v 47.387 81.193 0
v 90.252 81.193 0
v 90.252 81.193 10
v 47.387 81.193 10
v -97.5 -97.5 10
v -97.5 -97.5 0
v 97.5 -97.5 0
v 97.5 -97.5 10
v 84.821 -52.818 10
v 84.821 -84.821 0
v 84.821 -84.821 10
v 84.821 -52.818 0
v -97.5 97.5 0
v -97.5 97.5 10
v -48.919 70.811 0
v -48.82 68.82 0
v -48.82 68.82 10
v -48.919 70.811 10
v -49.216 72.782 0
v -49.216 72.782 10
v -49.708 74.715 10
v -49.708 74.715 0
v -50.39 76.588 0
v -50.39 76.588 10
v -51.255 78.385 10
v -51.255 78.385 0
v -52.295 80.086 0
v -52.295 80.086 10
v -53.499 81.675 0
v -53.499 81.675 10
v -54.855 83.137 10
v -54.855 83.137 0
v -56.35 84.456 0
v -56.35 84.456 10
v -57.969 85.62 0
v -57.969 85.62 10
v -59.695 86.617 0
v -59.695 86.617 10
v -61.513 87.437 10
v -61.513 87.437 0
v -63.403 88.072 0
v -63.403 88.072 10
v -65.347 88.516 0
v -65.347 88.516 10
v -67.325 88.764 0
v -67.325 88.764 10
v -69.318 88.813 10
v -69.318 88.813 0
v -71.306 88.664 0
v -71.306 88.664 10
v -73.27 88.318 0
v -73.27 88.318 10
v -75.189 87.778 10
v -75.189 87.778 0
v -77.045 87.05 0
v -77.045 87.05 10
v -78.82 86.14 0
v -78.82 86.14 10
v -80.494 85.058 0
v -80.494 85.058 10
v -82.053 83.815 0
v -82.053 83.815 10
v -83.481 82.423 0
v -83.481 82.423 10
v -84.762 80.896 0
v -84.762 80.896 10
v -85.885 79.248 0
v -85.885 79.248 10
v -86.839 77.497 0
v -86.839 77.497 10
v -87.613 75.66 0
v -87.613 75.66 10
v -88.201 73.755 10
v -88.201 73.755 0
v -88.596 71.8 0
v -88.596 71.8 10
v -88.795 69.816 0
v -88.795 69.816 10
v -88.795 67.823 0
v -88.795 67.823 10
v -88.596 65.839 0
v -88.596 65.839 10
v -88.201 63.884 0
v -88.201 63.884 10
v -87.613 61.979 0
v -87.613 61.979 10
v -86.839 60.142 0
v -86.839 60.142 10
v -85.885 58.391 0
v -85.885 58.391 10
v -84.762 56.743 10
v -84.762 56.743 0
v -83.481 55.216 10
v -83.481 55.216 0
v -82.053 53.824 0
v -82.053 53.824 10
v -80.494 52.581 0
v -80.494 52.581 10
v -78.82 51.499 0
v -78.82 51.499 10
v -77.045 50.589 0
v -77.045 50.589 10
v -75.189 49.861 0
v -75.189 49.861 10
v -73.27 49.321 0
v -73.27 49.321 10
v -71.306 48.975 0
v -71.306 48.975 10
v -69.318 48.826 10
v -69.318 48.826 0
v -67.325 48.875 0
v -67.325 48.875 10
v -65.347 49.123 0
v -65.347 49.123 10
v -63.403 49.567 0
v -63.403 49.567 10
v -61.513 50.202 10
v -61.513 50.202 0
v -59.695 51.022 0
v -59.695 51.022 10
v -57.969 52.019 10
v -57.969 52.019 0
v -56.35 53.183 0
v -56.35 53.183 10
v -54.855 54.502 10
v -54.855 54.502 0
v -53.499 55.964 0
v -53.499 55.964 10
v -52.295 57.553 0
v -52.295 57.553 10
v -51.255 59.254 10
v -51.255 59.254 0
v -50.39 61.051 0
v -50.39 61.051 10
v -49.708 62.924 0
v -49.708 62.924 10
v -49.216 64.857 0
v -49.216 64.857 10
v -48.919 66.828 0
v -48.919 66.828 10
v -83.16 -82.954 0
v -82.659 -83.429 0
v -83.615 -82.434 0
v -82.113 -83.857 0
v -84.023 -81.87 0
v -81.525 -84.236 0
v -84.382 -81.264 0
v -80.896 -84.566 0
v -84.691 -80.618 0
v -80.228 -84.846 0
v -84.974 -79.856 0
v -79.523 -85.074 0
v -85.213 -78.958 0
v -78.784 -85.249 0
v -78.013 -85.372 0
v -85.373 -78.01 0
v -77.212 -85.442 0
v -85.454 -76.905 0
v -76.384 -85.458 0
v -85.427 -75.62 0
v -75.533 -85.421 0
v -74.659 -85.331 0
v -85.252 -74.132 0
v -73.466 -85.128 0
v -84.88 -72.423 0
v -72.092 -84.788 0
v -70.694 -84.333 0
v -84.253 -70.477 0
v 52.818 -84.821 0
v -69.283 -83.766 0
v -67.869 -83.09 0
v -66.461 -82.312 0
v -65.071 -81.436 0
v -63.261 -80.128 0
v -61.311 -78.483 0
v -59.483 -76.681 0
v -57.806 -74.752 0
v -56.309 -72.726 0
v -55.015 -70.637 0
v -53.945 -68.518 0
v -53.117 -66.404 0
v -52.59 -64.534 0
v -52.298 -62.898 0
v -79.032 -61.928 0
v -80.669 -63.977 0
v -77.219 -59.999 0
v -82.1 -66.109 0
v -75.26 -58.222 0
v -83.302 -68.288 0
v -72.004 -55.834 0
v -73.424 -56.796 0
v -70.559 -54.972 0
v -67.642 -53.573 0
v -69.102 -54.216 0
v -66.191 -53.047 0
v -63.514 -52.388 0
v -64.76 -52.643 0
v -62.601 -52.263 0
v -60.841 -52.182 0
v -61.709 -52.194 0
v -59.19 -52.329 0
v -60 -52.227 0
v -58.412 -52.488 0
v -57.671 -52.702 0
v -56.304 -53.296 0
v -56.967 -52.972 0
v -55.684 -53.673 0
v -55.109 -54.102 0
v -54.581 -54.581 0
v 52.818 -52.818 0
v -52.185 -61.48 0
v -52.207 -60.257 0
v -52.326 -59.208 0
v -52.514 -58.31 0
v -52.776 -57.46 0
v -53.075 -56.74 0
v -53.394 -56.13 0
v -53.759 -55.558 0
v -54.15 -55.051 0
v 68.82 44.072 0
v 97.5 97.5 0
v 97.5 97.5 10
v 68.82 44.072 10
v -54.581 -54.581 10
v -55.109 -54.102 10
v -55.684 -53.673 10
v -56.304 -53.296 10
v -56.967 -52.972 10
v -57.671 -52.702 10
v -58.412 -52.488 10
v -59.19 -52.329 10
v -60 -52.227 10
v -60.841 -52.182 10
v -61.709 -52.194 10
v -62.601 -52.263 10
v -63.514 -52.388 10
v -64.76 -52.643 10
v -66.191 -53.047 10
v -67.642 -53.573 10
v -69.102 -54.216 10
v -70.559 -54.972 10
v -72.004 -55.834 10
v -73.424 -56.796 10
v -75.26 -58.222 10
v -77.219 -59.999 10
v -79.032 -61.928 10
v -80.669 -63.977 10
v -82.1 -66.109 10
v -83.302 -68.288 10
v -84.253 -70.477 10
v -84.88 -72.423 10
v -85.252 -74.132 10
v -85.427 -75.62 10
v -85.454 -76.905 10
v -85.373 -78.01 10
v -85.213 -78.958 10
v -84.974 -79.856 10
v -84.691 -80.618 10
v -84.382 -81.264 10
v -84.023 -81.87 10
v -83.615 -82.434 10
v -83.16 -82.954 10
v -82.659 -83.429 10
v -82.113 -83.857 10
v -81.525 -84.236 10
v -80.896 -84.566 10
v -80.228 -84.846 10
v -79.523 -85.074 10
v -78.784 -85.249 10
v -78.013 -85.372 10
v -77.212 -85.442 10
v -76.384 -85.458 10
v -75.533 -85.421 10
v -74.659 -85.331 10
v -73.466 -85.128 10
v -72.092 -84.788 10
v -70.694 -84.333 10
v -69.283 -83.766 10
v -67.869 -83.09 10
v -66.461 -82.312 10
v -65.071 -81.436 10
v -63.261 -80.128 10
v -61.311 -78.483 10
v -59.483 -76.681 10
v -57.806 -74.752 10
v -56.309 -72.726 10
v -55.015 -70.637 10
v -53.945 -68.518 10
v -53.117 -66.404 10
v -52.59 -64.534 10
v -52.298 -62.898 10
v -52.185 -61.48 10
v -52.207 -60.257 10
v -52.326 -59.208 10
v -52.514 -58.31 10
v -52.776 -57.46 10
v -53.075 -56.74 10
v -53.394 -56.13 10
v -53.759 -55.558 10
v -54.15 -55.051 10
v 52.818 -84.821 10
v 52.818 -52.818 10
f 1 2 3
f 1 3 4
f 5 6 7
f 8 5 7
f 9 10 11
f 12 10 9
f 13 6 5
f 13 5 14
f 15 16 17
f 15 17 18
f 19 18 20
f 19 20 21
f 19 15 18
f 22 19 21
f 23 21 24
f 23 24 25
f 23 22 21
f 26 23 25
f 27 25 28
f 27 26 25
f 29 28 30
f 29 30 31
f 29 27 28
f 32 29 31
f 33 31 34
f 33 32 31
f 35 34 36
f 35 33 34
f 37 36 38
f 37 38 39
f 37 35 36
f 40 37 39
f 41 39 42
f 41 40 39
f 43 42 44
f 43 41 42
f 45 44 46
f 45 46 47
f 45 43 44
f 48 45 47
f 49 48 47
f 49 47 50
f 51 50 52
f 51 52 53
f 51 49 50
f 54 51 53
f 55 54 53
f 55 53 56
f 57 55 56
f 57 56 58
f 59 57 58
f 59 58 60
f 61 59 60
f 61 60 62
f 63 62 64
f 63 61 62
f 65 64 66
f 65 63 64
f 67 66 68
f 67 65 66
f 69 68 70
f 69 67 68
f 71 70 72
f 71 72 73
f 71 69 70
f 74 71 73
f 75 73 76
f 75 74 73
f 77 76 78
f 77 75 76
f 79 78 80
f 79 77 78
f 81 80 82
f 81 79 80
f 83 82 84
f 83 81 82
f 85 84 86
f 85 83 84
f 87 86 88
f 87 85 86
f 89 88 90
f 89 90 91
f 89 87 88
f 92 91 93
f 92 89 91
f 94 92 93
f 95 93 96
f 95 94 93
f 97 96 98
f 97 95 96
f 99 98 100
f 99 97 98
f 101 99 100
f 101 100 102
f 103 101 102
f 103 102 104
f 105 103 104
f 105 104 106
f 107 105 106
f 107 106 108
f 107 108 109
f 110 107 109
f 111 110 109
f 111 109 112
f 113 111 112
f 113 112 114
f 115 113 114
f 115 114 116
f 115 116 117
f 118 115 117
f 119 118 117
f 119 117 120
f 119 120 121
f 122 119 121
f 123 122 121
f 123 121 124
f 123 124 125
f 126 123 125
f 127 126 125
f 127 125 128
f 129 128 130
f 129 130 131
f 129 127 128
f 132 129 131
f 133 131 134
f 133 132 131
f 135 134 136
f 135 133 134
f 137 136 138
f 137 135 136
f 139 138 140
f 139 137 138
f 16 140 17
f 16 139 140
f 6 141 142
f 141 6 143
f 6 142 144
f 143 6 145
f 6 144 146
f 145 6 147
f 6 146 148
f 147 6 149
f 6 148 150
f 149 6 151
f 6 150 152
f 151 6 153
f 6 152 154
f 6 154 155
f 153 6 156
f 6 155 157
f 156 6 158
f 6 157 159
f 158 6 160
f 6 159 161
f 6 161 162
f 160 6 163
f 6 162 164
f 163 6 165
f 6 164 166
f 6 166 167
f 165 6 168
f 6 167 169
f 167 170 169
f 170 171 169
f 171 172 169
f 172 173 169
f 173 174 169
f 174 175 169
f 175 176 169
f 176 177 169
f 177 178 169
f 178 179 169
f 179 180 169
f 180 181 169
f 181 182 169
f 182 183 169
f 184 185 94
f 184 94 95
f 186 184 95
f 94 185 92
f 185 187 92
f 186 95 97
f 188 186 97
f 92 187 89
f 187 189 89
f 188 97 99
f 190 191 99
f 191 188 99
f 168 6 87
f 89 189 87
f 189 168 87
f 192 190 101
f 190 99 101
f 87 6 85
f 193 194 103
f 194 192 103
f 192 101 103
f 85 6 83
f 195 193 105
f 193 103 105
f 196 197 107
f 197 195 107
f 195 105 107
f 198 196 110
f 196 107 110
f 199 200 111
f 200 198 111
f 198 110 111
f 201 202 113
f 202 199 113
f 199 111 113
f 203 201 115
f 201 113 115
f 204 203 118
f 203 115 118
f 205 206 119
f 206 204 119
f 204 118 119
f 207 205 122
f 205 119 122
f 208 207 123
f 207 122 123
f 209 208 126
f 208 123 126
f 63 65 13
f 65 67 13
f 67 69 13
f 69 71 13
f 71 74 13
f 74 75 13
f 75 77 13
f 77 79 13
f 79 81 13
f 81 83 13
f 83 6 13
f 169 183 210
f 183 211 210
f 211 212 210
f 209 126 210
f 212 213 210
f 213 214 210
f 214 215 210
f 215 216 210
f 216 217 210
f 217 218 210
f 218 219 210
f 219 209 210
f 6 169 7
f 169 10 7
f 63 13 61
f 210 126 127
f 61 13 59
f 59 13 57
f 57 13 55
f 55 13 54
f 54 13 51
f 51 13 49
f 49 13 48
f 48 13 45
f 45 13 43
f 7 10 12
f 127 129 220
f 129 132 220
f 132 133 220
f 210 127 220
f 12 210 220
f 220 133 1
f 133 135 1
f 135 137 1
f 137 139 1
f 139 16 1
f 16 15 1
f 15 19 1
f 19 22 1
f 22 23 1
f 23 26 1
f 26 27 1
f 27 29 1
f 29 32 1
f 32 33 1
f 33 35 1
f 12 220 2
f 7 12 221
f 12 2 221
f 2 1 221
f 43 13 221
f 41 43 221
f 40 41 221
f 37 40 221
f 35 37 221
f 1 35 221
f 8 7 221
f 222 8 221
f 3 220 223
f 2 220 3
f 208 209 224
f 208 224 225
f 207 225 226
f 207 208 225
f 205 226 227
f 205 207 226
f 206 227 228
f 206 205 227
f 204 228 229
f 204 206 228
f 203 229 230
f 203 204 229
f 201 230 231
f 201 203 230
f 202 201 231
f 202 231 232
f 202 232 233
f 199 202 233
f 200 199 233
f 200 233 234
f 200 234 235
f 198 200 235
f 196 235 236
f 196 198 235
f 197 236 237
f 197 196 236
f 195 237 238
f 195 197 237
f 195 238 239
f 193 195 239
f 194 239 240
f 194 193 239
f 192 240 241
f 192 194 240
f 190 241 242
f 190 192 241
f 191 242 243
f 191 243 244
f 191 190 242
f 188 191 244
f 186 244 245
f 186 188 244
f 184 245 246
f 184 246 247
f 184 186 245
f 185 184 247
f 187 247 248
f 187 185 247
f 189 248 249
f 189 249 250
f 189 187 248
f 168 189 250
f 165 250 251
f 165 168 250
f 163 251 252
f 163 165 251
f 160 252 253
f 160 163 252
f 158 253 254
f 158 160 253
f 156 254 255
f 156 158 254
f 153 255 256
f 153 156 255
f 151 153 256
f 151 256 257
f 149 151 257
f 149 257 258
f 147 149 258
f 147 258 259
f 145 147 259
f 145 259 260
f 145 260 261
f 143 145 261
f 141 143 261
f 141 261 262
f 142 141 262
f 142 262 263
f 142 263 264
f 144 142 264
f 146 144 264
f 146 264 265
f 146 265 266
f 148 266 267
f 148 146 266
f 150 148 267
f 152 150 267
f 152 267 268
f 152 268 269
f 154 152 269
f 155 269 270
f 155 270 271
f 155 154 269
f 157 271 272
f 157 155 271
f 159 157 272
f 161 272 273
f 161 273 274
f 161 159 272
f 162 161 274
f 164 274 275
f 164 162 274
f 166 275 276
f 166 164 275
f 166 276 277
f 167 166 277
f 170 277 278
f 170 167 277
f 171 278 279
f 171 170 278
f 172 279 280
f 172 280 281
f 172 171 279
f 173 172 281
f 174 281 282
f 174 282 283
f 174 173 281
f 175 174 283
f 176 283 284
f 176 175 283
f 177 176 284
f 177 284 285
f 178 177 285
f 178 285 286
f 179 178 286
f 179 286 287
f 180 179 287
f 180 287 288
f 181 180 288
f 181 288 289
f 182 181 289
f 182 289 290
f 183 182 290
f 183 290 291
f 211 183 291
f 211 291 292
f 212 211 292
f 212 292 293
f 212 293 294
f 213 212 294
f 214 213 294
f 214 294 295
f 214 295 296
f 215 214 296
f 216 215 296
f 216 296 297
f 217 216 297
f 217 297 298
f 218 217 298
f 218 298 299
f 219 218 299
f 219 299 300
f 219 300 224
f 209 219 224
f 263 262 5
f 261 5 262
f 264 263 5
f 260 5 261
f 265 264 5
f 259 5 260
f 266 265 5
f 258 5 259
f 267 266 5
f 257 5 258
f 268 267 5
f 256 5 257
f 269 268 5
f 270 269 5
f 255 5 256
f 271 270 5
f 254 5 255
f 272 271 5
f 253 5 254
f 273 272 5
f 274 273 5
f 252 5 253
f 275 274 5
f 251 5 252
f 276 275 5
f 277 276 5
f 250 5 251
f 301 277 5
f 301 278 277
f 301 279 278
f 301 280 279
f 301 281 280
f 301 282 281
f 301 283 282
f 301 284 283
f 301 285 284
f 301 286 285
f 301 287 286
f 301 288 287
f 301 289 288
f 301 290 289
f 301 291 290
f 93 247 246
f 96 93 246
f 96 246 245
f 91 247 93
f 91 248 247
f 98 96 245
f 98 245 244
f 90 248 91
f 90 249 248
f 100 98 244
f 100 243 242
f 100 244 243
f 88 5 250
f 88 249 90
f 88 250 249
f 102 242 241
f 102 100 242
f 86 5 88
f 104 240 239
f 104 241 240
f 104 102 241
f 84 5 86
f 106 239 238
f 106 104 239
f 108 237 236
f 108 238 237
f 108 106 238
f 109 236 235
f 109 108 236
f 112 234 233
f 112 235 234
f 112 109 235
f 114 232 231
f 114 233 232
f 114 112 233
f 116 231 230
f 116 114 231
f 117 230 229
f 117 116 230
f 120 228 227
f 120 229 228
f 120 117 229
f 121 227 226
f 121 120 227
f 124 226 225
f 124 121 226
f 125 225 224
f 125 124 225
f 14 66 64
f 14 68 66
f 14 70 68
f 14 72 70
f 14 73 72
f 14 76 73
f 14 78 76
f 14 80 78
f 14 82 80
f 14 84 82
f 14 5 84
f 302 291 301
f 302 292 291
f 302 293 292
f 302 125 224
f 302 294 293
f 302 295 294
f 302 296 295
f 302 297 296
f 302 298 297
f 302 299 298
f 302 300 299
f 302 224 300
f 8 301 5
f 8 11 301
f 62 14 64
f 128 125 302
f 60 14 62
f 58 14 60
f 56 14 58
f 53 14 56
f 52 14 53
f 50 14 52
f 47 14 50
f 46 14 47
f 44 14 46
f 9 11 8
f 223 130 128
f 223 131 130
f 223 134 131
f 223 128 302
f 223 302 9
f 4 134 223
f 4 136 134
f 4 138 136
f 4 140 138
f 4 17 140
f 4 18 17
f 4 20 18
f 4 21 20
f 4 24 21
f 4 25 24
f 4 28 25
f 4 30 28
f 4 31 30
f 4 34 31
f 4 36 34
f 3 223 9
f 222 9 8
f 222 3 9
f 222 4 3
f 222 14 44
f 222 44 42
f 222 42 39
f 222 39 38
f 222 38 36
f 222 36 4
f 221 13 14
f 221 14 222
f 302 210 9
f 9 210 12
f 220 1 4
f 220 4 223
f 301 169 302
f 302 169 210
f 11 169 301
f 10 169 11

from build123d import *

# Parameters (mm, degrees)
SKETCH1_W           = 195
SKETCH1_H           = 195
SKETCH1_R           = 20
SKETCH1_RX          = 20.136316196
SKETCH1_RY          = 12.177676937
SKETCH1_W_2         = 32.002781641
SKETCH1_H_2         = 32.002781641
BOSS_EXTRUDE1_DEPTH = 10


with BuildPart() as part:
    # Sketch1 → Boss-Extrude1 (new body)
    with BuildSketch(Plane.XY):
        Rectangle(SKETCH1_W, SKETCH1_H)
        with Locations((-68.819541029, 68.819541029)):
            Circle(SKETCH1_R, mode=Mode.SUBTRACT)
        with Locations(Location((-68.819541029, -68.819541029), (0, 0, 45))):
            Ellipse(SKETCH1_RX, SKETCH1_RY, mode=Mode.SUBTRACT)
        Polygon((68.819541029, 44.07162726), (90.251863044, 81.193497914), (47.387219014, 81.193497914), align=None, mode=Mode.SUBTRACT)
        with Locations((68.81954103, -68.81954103)):
            Rectangle(SKETCH1_W_2, SKETCH1_H_2, mode=Mode.SUBTRACT)
    extrude(amount=BOSS_EXTRUDE1_DEPTH)


solid = part.part
